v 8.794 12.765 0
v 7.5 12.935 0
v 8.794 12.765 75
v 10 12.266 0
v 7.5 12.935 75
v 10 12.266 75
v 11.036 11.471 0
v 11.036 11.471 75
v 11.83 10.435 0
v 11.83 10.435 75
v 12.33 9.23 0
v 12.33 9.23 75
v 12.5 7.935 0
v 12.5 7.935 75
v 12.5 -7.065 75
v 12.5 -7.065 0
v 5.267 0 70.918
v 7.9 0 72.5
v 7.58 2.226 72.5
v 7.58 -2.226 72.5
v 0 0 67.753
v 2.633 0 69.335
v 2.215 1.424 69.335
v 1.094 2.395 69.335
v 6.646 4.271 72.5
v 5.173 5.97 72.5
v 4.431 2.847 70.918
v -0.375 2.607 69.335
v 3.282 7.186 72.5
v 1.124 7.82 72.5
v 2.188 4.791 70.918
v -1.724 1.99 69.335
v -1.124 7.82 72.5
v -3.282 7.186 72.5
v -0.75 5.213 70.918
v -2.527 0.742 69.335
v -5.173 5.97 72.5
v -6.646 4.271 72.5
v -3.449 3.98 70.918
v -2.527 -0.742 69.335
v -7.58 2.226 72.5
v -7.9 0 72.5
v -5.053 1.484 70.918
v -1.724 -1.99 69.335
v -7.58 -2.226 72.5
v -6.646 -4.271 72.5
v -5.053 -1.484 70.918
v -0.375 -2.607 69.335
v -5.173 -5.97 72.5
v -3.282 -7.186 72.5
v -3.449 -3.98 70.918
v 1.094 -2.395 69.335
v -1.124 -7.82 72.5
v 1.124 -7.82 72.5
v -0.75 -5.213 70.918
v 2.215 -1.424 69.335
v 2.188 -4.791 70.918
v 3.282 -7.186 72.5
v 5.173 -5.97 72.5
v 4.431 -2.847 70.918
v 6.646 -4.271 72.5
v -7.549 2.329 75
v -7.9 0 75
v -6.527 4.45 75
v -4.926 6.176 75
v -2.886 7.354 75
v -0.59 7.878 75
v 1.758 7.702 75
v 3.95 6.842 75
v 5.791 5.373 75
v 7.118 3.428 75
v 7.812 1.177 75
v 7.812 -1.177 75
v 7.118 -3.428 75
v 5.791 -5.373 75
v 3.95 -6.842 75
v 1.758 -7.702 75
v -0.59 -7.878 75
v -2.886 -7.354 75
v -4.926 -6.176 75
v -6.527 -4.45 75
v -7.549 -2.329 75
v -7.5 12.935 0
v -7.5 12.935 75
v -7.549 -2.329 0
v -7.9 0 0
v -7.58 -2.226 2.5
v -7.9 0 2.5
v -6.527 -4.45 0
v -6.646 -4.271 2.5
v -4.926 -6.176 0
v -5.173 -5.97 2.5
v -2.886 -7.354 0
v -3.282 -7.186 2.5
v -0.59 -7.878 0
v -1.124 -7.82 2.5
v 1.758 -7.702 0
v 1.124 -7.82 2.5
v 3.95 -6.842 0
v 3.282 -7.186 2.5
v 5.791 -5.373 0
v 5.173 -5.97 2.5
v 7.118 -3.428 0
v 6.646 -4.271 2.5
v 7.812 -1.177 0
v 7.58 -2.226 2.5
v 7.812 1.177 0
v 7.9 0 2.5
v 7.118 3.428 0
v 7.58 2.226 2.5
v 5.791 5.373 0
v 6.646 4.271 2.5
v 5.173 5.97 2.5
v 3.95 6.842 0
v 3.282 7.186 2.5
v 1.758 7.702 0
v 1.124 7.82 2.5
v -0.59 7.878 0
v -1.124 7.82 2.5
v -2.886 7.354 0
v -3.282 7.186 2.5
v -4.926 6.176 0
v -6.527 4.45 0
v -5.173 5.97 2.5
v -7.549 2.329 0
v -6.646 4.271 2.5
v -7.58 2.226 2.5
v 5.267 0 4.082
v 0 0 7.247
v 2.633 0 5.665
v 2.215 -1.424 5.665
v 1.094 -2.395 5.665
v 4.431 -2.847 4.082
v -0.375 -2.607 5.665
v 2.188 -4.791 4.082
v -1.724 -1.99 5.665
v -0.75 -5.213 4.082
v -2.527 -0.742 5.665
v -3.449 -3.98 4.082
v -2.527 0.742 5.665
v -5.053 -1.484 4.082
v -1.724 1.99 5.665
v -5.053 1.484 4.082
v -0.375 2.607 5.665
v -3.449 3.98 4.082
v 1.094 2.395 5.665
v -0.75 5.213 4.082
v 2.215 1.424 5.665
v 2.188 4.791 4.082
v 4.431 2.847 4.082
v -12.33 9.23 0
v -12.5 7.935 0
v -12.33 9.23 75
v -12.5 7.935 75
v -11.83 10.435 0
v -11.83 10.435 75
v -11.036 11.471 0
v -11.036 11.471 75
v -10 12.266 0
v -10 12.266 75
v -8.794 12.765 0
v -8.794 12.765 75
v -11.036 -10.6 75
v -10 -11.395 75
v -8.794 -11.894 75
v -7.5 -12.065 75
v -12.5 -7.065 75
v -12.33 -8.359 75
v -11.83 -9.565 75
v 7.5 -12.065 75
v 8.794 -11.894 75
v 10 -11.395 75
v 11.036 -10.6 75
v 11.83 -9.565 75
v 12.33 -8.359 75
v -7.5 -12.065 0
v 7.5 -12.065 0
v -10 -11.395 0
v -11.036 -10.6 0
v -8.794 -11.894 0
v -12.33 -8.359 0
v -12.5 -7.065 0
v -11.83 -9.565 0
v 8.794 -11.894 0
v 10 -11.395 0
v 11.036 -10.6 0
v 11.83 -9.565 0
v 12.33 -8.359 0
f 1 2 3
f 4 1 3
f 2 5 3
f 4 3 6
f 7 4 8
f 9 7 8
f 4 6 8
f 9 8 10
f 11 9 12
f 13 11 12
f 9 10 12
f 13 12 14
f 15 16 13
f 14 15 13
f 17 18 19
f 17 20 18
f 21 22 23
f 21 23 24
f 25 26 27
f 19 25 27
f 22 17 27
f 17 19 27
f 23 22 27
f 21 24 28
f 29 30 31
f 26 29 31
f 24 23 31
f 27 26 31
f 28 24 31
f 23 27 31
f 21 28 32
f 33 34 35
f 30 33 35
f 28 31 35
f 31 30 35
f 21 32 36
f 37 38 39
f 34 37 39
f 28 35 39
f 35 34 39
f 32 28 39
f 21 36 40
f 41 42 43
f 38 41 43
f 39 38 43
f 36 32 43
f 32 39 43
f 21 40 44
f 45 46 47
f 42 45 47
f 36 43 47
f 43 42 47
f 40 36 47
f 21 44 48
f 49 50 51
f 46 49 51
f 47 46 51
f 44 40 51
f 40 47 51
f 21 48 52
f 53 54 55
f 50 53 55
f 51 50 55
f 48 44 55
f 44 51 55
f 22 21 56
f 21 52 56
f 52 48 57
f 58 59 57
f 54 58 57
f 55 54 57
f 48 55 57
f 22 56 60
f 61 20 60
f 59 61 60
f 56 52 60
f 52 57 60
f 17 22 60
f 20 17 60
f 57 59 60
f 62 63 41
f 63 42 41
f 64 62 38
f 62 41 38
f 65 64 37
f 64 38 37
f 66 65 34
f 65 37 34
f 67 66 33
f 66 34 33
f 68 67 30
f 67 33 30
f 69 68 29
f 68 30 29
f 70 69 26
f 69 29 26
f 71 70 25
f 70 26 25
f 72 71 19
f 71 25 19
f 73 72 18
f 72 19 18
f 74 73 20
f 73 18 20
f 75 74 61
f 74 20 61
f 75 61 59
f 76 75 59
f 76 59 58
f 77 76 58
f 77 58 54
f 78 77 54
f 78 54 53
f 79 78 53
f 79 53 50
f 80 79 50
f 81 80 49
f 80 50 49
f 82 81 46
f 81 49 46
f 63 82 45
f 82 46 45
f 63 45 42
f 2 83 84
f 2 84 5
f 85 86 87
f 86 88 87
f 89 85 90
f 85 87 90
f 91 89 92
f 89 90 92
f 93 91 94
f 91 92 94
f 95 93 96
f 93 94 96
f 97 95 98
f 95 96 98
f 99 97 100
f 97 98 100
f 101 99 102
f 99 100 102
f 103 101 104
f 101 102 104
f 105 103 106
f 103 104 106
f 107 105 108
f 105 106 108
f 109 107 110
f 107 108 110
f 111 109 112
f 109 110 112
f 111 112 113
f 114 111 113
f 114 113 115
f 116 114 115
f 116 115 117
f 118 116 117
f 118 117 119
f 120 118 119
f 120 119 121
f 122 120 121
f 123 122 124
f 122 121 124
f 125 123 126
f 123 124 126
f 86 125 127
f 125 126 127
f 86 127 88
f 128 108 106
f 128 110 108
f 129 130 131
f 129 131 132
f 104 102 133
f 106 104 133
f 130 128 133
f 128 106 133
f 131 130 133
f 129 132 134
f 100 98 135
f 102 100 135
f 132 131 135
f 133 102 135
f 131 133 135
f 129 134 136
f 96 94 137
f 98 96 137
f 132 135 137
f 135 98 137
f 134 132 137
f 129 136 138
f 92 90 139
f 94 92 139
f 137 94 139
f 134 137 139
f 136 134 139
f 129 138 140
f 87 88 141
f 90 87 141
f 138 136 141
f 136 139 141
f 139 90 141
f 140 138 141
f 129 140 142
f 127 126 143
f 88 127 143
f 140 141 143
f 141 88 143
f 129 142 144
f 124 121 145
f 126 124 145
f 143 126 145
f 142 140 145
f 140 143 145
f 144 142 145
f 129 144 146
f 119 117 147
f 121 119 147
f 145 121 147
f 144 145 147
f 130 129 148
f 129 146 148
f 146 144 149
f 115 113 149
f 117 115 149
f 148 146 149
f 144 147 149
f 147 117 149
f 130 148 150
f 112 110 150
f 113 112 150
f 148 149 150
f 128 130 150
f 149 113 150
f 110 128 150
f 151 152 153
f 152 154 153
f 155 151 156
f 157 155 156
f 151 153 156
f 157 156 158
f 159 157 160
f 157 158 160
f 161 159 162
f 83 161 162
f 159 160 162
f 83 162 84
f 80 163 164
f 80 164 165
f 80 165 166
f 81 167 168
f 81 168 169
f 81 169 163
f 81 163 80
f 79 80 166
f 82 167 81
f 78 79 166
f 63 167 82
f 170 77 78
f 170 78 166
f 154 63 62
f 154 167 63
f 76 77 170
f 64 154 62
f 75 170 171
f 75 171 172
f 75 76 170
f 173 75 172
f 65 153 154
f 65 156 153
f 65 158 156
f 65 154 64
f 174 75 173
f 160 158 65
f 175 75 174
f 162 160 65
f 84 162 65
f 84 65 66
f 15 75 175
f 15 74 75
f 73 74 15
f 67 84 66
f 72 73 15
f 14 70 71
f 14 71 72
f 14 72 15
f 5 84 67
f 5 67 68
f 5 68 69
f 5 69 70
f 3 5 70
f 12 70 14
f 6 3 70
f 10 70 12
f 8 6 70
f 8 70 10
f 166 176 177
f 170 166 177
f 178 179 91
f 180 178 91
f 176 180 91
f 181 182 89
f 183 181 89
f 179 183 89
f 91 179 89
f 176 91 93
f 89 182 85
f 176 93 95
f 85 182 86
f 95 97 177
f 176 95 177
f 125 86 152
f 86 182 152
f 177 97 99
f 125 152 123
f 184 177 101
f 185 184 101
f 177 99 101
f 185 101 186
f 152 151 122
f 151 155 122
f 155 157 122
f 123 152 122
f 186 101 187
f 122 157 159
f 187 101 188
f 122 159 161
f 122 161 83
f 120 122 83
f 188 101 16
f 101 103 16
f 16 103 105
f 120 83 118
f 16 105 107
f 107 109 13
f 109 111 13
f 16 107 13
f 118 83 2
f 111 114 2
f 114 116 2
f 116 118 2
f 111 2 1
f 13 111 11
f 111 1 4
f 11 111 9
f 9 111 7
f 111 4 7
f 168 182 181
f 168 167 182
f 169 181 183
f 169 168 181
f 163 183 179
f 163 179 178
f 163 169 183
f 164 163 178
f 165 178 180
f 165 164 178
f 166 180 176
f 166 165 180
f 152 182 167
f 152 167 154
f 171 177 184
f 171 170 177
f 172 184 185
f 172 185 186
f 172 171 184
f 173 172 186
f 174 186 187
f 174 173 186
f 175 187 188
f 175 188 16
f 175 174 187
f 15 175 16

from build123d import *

# Parameters (mm, degrees)
F0_W     = 25
F0_H     = 25
F1_DEPTH = 75
F4_D     = 15.8
F4_DEPTH = 2.5
F4_TIP   = 4.7467988903
F5_D     = 15.8
F5_DEPTH = 2.5
F5_TIP   = 4.7467988903
F6_R     = 5


with BuildPart() as f1:
    # F0 (on Top) → F1 (new body)
    with BuildSketch(Plane.XY):
        with Locations((0, 0.4354127725)):
            Rectangle(F0_W, F0_H)
    extrude(amount=F1_DEPTH)

    # F4
    with Locations(Plane(origin=(0, 0, 0), x_dir=(1, 0, 0), z_dir=(0, 0, -1))):
        with Locations((0, 0)):
            Hole(F4_D / 2, depth=F4_DEPTH)
            with Locations((0, 0, -(F4_DEPTH + F4_TIP / 2))):  # 118° drill point
                Cone(0, F4_D / 2, F4_TIP, mode=Mode.SUBTRACT)

    # F5
    with Locations(Plane.XY.offset(75)):
        with Locations((0, 0)):
            Hole(F5_D / 2, depth=F5_DEPTH)
            with Locations((0, 0, -(F5_DEPTH + F5_TIP / 2))):  # 118° drill point
                Cone(0, F5_D / 2, F5_TIP, mode=Mode.SUBTRACT)

    # F6
    f6_edges = [f1.edges().sort_by_distance(p)[0] for p in [
        (-12.5, 12.935413, 37.5),
        (-12.5, -12.064587, 37.5),
        (12.5, -12.064587, 37.5),
        (12.5, 12.935413, 37.5),
    ]]
    fillet(f6_edges, radius=F6_R)


solid = f1.part
